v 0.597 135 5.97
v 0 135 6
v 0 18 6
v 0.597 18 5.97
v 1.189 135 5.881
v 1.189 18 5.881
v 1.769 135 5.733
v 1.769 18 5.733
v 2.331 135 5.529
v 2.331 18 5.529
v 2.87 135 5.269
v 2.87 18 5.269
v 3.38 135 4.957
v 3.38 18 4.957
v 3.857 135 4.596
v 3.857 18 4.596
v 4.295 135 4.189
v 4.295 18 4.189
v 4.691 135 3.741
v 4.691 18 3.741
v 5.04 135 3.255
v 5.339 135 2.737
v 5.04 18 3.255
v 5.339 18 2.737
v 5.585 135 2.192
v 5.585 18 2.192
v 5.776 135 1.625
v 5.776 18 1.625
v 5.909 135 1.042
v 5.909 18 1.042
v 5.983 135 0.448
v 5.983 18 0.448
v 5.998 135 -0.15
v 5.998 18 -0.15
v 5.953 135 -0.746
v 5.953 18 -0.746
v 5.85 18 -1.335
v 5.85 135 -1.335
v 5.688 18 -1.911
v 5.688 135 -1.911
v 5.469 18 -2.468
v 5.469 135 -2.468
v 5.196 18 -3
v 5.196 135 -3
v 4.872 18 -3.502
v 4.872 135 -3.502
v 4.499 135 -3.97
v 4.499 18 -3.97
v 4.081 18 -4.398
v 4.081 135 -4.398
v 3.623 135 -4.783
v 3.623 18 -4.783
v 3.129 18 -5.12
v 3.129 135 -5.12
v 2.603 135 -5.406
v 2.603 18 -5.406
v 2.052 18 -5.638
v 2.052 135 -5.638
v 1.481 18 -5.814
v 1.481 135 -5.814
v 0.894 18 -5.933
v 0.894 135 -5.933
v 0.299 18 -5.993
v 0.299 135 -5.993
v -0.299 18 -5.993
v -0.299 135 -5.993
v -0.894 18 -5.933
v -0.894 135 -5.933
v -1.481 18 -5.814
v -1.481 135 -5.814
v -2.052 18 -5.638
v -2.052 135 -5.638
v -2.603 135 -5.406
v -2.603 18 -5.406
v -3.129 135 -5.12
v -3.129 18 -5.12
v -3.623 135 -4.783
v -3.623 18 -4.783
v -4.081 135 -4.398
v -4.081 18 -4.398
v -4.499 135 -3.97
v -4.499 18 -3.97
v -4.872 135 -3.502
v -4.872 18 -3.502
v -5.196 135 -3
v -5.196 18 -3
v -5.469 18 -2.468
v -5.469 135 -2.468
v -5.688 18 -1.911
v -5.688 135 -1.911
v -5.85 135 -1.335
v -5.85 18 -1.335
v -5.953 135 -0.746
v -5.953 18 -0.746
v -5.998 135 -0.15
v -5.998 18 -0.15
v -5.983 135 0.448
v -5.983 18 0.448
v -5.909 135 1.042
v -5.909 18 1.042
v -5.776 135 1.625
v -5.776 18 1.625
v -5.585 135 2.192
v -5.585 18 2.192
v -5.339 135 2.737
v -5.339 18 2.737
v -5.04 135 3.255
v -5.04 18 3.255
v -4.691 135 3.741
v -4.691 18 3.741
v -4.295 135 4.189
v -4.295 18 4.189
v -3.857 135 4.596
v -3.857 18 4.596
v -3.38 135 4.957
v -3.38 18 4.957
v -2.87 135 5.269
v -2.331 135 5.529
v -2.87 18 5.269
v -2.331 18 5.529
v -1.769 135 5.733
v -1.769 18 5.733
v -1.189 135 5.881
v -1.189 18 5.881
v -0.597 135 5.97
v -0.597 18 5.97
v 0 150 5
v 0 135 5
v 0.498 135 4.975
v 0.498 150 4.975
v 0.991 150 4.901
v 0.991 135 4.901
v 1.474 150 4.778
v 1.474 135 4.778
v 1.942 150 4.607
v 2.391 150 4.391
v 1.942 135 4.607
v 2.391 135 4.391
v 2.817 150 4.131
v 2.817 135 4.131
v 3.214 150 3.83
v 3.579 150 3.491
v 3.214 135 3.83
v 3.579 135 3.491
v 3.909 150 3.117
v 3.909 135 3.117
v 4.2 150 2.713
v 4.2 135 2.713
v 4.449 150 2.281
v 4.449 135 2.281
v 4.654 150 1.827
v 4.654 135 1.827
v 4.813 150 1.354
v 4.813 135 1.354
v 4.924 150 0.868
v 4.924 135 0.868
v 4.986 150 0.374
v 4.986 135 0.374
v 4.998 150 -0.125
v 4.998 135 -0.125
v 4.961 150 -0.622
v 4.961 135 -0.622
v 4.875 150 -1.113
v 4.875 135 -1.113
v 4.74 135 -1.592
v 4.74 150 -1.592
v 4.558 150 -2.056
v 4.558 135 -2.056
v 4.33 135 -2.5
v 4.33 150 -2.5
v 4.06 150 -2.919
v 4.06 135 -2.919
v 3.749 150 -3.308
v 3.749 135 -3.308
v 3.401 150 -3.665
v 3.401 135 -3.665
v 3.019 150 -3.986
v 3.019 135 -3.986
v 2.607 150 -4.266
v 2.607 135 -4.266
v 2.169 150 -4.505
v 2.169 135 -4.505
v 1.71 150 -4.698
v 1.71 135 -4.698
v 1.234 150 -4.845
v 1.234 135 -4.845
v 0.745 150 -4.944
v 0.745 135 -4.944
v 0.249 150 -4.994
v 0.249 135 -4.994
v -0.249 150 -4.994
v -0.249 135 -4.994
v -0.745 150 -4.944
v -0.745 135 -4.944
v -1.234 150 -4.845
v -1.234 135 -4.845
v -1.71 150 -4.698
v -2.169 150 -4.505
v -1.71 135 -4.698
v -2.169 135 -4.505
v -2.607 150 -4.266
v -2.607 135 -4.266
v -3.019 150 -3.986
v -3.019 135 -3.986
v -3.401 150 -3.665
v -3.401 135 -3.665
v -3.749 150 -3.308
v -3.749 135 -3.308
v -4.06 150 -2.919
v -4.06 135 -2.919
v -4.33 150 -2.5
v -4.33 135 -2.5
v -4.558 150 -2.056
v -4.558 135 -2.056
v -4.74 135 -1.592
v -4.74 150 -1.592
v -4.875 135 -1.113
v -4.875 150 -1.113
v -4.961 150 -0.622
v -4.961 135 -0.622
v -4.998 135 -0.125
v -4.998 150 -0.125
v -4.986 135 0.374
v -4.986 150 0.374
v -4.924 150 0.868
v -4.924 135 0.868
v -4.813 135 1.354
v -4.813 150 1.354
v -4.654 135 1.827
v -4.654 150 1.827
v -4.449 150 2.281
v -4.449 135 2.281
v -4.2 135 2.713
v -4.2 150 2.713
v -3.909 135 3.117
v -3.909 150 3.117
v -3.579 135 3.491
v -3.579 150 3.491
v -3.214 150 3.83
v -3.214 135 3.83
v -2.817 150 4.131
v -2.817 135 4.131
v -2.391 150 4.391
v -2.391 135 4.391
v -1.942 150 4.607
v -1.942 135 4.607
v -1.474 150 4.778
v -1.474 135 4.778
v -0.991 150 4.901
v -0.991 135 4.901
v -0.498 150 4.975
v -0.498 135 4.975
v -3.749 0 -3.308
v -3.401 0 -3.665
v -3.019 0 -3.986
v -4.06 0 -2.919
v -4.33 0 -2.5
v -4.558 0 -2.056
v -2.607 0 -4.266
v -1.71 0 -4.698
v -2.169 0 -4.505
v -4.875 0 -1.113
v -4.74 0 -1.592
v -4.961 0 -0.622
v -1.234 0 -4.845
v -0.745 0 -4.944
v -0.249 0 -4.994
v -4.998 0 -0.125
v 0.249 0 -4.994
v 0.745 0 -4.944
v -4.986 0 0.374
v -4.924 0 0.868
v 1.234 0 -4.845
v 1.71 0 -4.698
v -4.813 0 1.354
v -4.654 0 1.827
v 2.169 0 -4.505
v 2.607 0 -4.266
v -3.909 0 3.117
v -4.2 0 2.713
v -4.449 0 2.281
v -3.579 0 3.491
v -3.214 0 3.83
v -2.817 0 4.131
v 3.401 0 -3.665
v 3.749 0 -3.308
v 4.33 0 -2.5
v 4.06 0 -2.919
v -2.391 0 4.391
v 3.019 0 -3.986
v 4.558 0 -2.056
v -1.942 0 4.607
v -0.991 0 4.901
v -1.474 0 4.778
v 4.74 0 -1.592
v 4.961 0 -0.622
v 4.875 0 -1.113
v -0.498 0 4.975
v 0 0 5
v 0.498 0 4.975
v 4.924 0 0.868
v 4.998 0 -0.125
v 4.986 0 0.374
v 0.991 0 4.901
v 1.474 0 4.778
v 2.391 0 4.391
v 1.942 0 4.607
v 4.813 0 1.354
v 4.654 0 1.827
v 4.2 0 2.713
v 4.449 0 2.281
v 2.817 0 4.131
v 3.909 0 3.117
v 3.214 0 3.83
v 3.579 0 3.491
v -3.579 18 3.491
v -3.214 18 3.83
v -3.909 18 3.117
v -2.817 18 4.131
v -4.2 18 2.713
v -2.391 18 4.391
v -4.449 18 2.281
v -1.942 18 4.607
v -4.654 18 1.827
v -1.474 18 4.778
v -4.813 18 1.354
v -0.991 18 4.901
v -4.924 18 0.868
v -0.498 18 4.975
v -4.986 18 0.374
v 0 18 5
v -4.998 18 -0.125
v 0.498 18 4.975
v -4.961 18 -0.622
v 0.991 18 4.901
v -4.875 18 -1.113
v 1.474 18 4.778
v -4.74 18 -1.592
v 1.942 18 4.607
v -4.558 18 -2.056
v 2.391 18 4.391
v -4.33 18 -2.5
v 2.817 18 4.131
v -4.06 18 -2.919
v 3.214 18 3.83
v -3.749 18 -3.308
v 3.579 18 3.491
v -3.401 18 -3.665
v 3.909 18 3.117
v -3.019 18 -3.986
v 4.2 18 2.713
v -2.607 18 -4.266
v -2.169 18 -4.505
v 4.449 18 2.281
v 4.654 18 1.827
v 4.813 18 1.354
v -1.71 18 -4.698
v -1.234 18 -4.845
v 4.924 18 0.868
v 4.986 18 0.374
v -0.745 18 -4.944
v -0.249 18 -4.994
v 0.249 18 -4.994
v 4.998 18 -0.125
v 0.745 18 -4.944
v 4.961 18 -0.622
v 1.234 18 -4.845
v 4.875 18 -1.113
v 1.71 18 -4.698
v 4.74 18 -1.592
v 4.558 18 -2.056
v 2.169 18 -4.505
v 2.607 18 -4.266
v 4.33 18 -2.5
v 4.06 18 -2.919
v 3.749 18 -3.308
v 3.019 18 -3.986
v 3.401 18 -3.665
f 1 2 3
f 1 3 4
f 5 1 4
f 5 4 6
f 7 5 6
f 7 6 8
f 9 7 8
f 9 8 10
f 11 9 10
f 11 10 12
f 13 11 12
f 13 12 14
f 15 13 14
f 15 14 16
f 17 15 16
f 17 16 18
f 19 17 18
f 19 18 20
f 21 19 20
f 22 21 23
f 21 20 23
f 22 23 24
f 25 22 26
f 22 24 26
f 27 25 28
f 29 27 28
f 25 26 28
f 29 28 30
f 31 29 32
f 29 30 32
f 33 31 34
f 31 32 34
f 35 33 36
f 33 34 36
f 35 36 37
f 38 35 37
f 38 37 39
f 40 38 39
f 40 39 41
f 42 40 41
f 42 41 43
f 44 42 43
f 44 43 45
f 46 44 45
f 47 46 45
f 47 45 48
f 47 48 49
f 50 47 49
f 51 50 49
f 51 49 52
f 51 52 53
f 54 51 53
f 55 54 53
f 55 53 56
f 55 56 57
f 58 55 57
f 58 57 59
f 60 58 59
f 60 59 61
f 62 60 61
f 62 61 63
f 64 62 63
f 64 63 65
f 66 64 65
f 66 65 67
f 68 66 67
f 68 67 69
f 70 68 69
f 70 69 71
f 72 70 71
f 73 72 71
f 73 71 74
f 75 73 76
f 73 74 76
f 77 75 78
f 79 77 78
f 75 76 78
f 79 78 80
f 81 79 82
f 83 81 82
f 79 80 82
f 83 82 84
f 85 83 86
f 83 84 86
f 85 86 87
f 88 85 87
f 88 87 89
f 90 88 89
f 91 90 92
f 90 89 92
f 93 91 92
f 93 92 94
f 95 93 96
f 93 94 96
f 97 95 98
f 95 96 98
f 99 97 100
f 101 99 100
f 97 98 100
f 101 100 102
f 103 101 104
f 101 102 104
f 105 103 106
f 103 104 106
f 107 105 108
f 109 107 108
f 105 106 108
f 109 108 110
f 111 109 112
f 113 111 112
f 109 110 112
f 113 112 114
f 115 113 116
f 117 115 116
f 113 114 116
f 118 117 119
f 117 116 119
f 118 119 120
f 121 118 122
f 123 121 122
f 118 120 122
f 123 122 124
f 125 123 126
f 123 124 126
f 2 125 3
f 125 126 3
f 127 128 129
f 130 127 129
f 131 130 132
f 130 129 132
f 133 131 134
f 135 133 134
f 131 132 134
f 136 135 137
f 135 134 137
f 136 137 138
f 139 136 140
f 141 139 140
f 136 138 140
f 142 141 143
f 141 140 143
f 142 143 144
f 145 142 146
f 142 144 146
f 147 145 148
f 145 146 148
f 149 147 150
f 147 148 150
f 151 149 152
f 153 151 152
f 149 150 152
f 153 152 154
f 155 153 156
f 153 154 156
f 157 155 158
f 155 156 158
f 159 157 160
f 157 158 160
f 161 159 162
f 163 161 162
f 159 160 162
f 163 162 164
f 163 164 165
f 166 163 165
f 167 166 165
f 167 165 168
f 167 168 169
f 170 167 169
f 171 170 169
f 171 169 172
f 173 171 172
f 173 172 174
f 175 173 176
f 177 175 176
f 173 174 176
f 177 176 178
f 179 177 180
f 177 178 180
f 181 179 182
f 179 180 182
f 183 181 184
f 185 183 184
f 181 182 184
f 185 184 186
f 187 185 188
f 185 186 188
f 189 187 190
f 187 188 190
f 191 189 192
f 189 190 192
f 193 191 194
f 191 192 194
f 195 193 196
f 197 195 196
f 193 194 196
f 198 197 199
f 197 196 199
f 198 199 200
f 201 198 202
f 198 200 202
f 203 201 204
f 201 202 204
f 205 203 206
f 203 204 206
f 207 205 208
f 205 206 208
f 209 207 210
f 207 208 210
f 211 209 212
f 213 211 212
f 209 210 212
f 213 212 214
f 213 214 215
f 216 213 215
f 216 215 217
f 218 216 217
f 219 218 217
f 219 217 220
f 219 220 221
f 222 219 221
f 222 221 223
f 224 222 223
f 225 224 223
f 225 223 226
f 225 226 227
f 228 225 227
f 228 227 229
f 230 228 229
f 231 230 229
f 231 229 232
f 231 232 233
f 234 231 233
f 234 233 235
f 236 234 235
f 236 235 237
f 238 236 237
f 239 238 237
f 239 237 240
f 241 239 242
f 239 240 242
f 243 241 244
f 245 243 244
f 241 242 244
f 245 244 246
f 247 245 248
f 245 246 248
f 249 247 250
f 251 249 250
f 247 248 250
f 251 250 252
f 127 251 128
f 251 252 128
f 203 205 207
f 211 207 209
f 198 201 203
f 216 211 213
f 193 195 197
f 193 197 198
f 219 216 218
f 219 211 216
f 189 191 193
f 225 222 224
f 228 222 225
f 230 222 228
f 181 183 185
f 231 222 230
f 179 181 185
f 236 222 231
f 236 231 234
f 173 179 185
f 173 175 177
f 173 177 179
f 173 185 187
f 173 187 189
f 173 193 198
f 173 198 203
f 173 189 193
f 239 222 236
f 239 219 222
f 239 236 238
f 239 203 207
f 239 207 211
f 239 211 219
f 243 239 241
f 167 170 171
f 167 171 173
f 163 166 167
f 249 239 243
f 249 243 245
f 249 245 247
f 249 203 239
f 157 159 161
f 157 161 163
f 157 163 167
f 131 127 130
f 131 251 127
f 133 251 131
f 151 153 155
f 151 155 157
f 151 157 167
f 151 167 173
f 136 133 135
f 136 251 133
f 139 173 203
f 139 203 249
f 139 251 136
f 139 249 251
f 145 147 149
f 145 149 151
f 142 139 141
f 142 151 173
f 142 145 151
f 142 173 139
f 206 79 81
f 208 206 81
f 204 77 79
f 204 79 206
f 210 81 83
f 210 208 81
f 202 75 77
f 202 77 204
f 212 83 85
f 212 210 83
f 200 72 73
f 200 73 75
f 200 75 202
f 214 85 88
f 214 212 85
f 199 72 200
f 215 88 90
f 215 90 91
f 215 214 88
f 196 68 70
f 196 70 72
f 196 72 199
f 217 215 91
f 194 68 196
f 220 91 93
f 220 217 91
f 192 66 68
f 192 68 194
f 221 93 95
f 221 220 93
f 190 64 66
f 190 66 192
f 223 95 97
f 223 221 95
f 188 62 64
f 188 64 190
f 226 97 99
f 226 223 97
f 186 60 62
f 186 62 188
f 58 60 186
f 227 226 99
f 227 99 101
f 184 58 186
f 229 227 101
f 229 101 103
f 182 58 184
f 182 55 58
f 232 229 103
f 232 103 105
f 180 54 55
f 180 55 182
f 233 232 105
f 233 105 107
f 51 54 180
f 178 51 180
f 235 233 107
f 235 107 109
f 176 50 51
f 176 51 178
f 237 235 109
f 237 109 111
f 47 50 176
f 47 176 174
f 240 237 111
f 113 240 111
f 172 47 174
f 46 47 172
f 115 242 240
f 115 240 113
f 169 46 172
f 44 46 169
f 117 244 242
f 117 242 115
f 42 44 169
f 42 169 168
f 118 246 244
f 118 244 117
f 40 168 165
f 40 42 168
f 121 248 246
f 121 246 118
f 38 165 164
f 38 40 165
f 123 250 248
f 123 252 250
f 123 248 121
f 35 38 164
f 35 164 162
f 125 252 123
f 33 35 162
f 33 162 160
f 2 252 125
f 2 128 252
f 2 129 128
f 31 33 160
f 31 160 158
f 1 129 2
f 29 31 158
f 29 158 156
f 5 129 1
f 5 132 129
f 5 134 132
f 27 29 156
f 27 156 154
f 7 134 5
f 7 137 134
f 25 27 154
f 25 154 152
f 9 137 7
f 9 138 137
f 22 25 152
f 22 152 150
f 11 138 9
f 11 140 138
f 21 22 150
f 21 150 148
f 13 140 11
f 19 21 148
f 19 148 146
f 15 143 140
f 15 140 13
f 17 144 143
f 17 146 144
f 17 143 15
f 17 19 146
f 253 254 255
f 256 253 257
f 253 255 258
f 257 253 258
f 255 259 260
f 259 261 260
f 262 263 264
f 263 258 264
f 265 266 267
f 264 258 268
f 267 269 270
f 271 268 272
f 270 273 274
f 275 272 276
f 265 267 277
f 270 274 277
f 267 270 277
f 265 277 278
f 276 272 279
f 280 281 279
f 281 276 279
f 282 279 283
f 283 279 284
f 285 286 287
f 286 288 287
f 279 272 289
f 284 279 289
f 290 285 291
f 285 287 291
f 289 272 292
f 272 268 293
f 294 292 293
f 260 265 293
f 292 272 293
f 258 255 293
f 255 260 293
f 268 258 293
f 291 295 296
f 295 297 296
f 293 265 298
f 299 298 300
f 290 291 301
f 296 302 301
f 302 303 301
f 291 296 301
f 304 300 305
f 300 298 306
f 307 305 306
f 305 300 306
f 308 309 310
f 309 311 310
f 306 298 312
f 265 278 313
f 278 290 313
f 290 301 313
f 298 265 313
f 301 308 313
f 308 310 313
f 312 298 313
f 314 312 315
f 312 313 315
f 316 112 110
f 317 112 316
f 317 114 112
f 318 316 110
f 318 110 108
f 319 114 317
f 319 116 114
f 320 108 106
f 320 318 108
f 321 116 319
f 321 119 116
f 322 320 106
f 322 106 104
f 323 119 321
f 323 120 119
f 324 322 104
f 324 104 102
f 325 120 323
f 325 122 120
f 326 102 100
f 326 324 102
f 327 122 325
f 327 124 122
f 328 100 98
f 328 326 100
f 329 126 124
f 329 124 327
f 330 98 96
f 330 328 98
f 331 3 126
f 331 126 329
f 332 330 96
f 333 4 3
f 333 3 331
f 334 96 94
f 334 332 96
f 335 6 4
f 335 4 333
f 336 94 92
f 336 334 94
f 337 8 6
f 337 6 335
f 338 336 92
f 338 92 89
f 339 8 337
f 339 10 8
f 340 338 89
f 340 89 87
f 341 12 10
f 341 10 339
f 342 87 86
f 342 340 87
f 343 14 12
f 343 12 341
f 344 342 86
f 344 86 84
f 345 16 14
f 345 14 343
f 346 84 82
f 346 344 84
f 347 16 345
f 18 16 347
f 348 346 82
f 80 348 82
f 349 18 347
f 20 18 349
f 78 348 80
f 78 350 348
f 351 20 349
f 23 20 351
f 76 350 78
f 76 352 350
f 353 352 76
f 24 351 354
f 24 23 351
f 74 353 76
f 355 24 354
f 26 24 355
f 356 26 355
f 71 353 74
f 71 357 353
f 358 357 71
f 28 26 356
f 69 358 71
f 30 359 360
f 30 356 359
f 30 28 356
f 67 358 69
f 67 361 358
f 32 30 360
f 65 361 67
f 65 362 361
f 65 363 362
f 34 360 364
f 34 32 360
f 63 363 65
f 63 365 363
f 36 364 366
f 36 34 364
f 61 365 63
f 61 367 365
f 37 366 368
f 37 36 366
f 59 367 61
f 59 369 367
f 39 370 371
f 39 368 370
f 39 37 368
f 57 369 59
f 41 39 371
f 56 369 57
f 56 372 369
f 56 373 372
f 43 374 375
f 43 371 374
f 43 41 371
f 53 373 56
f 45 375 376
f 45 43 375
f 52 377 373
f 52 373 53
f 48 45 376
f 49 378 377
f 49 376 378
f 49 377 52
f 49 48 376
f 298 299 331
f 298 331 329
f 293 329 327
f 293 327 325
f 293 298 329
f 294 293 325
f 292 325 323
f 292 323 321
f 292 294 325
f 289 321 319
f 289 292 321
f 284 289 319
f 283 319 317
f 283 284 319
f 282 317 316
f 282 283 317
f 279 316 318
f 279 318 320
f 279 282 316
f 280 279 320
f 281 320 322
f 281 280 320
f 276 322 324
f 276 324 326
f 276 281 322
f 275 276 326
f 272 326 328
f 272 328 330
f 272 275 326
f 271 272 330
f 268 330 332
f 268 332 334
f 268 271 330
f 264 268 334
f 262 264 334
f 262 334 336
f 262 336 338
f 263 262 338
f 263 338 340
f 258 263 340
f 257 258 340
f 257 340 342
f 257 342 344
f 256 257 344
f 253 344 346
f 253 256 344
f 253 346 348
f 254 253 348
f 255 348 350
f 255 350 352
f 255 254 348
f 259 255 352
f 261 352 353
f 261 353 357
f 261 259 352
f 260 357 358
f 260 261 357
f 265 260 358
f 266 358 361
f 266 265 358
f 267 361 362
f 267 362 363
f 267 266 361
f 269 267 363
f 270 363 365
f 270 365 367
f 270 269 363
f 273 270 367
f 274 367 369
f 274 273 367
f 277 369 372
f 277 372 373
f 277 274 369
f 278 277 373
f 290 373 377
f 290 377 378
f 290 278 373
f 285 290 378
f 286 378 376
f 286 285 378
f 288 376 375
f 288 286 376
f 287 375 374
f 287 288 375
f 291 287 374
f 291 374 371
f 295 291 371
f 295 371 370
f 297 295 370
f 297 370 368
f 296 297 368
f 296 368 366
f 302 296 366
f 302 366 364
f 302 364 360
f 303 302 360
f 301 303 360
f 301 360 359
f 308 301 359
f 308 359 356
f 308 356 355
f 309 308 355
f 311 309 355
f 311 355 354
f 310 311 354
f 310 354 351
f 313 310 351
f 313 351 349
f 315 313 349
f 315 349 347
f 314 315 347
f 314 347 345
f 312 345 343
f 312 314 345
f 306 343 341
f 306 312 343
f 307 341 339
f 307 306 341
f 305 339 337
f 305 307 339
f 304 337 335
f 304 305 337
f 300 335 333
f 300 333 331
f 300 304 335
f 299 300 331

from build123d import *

# Parameters (mm, degrees)
SKETCH_1_R          = 6
EXTRUDE_1_DEPTH     = 150
CUT_EXTRUDE_START   = -15
SKETCH_2_R          = 6
SKETCH_2_R_2        = 5
CUT_EXTRUDE_1_DEPTH = 15
SKETCH_3_R          = 6
SKETCH_3_R_2        = 5
CUT_EXTRUDE_2_DEPTH = 18


with BuildPart() as part:
    # ｽｹｯﾁ1 → ﾎﾞｽ - 押し出し1 (new body)
    with BuildSketch(Plane(origin=(0, 0, 0), x_dir=(1, 0, 0), z_dir=(0, 1, 0))):
        with Locations(Location((0, 0, 0), (0, 0, 270))):
            Circle(SKETCH_1_R)
    extrude(amount=EXTRUDE_1_DEPTH)

    # ｽｹｯﾁ2 → ｶｯﾄ - 押し出し1 (cut)
    with BuildSketch(Plane(origin=(0, 150, 0), x_dir=(1, 0, 0), z_dir=(0, 1, 0)).offset(CUT_EXTRUDE_START)):
        with Locations(Location((0, 0, 0), (0, 0, 270))):
            Circle(SKETCH_2_R)
        with Locations(Location((0, 0, 0), (0, 0, 270))):
            Circle(SKETCH_2_R_2, mode=Mode.SUBTRACT)
    extrude(amount=CUT_EXTRUDE_1_DEPTH, mode=Mode.SUBTRACT)

    # ｽｹｯﾁ3 → ｶｯﾄ - 押し出し2 (cut)
    with BuildSketch(Plane(origin=(0, 0, 0), x_dir=(-1, 0, 0), z_dir=(0, -1, 0))):
        with Locations(Location((0, 0, 0), (0, 0, 90))):
            Circle(SKETCH_3_R)
        with Locations(Location((0, 0, 0), (0, 0, 270))):
            Circle(SKETCH_3_R_2, mode=Mode.SUBTRACT)
    extrude(amount=-CUT_EXTRUDE_2_DEPTH, mode=Mode.SUBTRACT)


solid = part.part
